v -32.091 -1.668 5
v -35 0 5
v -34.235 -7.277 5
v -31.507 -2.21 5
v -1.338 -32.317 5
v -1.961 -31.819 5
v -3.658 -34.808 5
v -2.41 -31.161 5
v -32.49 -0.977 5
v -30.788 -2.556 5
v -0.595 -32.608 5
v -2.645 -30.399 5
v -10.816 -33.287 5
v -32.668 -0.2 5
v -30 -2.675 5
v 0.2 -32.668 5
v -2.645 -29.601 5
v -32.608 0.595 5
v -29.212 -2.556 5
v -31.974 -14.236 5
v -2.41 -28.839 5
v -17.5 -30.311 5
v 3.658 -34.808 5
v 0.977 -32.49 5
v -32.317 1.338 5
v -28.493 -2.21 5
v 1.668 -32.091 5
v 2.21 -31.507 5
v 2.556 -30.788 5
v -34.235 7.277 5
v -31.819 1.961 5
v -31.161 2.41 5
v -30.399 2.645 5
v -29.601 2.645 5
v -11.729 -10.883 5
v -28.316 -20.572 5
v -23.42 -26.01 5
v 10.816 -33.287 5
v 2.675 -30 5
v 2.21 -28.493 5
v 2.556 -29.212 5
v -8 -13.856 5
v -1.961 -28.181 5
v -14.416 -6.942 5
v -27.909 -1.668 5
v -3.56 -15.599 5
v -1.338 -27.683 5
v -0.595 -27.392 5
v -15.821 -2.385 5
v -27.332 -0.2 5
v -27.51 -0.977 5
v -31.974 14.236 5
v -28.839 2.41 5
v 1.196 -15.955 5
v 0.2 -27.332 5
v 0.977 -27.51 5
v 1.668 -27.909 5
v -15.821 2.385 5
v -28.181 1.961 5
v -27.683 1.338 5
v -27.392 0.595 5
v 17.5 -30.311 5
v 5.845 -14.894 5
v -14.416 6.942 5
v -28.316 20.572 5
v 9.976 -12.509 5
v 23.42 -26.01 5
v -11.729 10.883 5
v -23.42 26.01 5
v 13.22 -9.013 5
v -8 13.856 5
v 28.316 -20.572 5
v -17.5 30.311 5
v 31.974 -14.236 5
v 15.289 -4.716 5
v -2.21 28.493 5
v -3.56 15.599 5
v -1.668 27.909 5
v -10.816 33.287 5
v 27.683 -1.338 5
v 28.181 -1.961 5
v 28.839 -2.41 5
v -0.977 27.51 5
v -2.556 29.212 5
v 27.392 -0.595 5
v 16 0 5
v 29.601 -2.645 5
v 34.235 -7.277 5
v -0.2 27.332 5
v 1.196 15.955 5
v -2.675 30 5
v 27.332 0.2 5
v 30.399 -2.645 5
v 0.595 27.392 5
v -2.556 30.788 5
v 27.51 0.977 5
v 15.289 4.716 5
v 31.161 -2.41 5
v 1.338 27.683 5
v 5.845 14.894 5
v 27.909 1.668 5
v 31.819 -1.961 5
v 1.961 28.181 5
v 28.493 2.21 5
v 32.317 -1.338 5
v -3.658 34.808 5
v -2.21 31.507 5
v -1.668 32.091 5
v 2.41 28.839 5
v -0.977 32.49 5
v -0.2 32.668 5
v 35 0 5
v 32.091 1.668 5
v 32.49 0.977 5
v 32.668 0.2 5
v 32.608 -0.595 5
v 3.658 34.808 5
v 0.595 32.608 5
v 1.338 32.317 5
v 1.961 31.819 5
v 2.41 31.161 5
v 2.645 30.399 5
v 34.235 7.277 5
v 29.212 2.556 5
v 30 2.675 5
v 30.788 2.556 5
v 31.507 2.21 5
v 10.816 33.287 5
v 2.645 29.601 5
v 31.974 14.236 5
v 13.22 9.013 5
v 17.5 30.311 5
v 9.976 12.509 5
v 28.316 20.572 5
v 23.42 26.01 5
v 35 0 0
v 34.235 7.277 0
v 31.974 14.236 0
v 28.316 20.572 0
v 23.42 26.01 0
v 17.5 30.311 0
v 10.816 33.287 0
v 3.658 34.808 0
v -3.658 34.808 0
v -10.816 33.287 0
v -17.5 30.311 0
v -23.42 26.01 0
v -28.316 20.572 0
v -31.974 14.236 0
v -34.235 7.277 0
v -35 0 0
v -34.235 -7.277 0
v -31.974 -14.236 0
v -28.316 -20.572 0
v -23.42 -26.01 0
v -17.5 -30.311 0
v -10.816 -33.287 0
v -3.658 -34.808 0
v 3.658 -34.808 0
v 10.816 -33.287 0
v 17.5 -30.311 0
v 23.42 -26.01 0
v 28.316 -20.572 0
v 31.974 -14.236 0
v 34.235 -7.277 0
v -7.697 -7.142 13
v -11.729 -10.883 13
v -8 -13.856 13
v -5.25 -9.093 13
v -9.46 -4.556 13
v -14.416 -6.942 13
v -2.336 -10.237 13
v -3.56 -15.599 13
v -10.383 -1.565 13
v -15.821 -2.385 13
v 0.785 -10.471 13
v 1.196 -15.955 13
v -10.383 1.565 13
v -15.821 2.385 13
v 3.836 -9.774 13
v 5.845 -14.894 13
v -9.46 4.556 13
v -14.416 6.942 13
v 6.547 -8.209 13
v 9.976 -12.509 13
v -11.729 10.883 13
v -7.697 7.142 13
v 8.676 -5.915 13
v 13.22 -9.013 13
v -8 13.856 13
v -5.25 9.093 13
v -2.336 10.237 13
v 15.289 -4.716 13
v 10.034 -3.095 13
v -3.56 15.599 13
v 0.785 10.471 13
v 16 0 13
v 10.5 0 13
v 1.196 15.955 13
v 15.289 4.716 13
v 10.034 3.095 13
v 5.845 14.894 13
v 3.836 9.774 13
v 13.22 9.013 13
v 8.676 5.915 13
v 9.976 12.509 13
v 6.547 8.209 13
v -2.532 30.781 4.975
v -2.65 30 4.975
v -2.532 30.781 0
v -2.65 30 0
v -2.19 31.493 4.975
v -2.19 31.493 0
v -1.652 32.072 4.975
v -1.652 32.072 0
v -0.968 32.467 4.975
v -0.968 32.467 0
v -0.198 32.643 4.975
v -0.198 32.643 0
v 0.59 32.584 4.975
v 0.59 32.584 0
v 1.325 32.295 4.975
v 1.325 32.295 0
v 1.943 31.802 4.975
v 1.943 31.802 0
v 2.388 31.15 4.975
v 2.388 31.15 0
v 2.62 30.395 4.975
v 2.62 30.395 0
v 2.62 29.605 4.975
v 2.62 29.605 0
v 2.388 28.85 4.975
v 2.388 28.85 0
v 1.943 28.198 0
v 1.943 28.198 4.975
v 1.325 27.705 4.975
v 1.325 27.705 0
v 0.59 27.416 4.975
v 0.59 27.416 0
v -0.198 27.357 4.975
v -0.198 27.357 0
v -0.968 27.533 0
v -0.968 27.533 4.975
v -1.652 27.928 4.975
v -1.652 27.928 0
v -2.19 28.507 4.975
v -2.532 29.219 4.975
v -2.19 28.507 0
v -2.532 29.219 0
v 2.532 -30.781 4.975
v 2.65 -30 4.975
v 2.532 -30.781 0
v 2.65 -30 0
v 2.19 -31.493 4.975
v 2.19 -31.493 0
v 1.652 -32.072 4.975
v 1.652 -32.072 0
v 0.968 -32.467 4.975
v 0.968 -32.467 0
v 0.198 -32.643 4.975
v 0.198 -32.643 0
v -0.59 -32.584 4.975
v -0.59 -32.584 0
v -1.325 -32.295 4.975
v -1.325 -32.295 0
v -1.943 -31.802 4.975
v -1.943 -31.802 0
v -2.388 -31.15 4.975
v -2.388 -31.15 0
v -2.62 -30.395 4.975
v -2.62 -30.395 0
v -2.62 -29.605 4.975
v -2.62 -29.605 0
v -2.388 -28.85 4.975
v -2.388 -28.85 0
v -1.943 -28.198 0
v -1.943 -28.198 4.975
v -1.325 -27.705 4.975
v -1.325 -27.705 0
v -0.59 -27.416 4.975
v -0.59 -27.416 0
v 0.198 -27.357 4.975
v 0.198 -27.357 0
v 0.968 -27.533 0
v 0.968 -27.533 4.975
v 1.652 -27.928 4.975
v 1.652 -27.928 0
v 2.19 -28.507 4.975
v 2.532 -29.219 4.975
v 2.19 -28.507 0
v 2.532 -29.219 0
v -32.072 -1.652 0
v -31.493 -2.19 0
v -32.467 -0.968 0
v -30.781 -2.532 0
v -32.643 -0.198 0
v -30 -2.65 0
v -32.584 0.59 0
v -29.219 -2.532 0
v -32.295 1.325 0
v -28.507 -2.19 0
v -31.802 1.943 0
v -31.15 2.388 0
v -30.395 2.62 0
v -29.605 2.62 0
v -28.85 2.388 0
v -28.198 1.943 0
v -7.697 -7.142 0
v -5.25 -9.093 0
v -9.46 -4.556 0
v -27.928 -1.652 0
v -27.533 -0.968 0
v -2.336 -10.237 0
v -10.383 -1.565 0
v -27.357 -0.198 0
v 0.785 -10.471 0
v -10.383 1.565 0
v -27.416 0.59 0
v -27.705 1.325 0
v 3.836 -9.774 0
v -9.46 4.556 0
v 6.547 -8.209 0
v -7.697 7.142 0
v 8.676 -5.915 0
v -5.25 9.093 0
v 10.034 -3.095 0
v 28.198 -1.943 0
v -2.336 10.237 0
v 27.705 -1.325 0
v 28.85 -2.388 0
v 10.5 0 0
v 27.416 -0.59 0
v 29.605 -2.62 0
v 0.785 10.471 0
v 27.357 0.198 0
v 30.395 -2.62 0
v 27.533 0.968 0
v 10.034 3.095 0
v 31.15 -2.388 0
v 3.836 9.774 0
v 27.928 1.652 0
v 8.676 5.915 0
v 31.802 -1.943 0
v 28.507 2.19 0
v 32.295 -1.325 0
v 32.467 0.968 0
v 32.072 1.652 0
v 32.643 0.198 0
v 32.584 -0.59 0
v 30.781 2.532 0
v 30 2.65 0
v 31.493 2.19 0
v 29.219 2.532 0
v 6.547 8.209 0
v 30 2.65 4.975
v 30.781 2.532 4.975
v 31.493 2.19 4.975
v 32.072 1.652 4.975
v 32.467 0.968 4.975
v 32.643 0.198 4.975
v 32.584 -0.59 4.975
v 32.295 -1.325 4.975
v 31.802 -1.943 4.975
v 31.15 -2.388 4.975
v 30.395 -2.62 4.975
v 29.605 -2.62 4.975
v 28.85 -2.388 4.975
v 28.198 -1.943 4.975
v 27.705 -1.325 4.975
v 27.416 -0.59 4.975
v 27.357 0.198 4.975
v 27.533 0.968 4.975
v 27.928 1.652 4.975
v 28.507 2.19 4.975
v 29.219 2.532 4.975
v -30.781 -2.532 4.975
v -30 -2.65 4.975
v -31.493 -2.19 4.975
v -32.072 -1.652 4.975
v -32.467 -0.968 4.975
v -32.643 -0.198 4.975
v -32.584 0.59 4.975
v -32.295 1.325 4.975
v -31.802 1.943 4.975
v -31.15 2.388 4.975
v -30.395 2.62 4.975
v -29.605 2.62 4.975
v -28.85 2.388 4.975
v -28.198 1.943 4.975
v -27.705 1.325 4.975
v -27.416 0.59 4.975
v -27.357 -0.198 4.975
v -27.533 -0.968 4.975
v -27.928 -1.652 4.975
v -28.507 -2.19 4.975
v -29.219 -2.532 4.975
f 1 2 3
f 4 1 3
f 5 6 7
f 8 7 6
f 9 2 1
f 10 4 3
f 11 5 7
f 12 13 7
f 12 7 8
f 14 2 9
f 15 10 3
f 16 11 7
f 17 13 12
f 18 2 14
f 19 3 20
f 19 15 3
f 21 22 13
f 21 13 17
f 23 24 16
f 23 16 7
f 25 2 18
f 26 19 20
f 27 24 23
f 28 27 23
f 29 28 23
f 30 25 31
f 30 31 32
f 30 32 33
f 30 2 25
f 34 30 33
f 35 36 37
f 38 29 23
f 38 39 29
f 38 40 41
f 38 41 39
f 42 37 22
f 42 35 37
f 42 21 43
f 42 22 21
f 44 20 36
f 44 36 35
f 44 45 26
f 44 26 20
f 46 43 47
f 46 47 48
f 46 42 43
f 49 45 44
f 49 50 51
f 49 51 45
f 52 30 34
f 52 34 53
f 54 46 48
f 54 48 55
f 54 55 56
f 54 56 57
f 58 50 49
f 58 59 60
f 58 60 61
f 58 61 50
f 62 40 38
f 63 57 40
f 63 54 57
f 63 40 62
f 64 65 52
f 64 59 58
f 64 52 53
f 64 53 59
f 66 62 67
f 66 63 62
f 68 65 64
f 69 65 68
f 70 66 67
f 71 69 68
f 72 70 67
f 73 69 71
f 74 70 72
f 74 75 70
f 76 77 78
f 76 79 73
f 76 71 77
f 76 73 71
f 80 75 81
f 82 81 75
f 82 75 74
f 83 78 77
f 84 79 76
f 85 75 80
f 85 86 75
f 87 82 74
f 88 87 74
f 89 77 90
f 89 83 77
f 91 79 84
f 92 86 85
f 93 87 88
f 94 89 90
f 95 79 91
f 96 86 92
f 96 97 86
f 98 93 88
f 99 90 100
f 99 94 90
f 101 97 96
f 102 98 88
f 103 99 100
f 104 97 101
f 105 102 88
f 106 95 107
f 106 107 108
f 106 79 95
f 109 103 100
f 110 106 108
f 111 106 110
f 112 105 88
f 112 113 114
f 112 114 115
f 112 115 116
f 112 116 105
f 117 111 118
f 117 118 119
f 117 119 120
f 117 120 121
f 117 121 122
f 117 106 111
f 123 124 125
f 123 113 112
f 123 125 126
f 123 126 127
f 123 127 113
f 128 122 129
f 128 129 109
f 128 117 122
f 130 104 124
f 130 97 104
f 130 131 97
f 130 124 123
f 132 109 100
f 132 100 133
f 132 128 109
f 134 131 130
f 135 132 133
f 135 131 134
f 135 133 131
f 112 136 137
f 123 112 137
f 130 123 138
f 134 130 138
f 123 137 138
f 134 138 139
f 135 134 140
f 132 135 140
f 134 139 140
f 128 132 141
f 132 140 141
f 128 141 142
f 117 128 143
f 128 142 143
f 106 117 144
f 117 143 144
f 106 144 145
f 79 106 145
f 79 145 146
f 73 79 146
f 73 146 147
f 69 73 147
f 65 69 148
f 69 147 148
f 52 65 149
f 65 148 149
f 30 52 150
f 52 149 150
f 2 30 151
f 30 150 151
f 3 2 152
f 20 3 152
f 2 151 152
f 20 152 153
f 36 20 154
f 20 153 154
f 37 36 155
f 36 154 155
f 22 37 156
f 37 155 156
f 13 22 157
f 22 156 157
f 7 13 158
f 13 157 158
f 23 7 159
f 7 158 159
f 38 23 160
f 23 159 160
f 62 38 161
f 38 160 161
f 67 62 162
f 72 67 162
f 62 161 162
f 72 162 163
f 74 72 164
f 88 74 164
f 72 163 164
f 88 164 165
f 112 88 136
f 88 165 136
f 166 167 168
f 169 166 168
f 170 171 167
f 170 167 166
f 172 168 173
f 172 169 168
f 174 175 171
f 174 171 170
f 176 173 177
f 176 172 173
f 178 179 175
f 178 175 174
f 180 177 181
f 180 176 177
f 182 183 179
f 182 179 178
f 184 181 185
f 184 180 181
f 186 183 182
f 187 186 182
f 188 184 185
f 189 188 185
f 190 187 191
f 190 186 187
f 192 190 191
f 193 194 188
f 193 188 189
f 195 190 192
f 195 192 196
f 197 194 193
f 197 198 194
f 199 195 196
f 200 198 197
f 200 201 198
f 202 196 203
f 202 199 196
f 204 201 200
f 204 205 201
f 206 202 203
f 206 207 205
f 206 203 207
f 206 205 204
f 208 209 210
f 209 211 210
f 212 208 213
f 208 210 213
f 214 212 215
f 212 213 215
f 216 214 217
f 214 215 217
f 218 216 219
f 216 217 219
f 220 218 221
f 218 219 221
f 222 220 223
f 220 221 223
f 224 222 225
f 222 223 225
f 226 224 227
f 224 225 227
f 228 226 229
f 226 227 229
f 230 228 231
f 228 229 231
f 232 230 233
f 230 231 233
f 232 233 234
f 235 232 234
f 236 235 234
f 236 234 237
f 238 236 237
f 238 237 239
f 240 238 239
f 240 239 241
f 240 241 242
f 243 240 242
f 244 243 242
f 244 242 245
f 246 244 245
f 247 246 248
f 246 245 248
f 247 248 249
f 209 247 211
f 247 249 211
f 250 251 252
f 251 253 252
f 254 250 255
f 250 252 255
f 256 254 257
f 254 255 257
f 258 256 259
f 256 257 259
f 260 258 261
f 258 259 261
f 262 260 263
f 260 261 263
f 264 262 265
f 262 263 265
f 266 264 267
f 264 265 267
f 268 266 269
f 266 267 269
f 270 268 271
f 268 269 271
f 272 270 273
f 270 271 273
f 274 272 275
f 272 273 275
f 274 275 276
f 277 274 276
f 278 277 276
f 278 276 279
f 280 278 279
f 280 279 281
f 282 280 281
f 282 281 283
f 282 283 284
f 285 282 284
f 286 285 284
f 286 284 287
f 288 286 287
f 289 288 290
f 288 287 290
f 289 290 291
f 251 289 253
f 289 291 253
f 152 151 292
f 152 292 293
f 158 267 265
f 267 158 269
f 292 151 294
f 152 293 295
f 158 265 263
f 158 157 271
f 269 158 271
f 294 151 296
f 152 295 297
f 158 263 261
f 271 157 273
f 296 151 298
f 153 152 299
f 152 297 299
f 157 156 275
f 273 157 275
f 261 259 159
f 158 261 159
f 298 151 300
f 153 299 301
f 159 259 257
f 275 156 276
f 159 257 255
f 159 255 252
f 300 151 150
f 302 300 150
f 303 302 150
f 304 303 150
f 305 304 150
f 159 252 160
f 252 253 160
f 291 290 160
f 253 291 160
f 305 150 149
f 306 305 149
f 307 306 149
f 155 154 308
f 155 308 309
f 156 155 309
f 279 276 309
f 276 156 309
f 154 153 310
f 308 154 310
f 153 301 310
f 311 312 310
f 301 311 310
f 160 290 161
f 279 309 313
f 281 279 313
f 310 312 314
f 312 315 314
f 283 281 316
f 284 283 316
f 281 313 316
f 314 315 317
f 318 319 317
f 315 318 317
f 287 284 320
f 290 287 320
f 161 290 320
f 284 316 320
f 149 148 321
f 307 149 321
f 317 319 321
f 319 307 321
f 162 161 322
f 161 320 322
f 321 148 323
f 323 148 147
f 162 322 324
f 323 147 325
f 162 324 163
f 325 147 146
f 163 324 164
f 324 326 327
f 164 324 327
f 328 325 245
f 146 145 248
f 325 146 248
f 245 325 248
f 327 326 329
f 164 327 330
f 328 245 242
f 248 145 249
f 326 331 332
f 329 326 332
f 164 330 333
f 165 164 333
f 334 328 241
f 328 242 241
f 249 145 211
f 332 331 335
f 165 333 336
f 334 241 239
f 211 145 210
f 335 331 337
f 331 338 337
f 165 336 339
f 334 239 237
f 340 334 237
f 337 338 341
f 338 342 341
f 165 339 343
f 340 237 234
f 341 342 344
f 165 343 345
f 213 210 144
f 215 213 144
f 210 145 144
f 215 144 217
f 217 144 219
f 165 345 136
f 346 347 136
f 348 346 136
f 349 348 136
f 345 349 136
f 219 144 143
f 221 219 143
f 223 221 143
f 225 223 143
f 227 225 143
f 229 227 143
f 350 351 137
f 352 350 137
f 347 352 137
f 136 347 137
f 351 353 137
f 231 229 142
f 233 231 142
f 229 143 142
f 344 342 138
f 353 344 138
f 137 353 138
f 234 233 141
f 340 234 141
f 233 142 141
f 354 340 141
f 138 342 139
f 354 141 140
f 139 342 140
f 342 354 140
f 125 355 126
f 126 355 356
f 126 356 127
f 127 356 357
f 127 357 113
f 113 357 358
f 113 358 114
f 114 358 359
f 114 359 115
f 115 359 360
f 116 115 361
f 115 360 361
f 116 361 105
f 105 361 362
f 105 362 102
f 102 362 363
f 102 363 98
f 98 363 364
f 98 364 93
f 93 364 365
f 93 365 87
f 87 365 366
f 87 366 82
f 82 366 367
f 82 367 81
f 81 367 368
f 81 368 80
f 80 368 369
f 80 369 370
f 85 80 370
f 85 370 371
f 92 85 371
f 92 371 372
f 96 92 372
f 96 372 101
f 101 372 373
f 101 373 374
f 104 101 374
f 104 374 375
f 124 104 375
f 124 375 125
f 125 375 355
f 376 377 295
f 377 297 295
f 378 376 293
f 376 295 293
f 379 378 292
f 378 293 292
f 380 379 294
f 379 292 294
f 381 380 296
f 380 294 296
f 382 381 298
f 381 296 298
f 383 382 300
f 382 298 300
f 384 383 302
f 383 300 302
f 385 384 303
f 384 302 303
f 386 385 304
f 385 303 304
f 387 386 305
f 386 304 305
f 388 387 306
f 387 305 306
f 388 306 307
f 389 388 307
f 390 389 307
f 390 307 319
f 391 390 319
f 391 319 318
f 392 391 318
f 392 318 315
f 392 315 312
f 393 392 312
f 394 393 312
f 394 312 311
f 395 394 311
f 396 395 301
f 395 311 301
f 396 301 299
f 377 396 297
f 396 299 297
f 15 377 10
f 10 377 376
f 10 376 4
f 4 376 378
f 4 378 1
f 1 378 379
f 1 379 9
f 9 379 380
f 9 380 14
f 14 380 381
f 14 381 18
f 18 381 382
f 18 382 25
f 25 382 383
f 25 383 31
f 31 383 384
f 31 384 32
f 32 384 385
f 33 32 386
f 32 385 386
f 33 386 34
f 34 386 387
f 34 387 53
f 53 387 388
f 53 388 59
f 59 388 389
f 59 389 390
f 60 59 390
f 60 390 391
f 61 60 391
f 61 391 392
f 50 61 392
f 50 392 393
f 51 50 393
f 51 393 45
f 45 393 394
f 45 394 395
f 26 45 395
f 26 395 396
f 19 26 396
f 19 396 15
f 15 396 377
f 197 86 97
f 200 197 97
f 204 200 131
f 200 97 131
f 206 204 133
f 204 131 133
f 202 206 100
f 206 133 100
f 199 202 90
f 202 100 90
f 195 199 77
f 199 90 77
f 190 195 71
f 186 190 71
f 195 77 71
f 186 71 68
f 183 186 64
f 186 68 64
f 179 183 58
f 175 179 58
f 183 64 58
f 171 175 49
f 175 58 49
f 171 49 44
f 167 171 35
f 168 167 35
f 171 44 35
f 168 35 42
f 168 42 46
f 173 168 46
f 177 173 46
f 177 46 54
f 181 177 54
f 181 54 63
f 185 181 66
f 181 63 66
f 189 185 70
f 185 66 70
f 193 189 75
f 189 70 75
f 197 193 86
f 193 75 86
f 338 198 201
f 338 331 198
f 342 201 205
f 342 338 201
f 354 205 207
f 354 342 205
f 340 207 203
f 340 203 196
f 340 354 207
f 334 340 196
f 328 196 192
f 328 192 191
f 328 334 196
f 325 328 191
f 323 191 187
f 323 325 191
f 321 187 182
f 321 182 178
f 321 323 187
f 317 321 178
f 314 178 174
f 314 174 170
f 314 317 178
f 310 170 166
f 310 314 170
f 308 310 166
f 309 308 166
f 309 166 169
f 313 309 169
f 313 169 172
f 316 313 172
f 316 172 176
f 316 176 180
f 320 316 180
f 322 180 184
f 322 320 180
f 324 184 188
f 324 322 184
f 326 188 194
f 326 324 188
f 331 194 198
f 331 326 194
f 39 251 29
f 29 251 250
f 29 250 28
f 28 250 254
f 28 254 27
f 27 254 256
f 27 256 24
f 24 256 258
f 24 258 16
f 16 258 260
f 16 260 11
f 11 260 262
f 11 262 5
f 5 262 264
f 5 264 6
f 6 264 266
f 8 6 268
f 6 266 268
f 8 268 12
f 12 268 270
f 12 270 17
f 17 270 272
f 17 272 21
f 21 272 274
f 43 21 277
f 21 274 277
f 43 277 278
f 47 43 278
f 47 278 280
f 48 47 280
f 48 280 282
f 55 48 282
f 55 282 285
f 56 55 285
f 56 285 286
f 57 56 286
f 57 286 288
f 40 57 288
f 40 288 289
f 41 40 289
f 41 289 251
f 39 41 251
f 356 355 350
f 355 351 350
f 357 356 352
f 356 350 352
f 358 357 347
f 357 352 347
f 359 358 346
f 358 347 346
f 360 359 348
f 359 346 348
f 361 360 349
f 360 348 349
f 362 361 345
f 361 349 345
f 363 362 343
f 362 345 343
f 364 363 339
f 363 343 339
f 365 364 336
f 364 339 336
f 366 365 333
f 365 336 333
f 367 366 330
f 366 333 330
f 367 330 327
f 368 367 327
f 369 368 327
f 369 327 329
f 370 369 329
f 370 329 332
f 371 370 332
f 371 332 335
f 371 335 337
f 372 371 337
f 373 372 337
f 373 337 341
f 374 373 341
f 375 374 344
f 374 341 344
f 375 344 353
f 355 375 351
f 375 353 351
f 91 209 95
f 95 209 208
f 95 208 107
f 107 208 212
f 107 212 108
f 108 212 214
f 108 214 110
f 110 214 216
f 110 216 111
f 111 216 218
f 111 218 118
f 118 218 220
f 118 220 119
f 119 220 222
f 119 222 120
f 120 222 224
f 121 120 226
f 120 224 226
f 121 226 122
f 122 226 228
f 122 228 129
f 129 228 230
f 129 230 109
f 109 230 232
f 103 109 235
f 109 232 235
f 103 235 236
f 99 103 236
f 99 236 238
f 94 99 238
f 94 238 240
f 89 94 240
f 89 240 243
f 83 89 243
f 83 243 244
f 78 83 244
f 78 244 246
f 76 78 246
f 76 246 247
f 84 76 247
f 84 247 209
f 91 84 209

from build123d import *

# Parameters (mm, degrees)
SKETCH1_R                      = 35
SKETCH1_R_2                    = 10.5
BOSS_EXTRUDE1_DEPTH            = 5
M5_CLEARANCE_HOLE1_D           = 5.3
M5_CLEARANCE_HOLE1_CSINK_D     = 5.35
M5_CLEARANCE_HOLE1_CSINK_ANGLE = 90
CIRPATTERN1_COUNT              = 4
SKETCH5_R                      = 16
SKETCH5_R_2                    = 10.5
BOSS_EXTRUDE2_DEPTH            = 8


with BuildPart() as part:
    # Sketch1 → Boss-Extrude1 (new body)
    with BuildSketch(Plane.XY):
        Circle(SKETCH1_R)
        Circle(SKETCH1_R_2, mode=Mode.SUBTRACT)
    extrude(amount=BOSS_EXTRUDE1_DEPTH)

    # M5 Clearance Hole1 (through all)
    with Locations(Plane.XY.offset(5)):
        with Locations((0, 30)):
            m5_clearance_hole1 = CounterSinkHole(M5_CLEARANCE_HOLE1_D / 2, M5_CLEARANCE_HOLE1_CSINK_D / 2, counter_sink_angle=M5_CLEARANCE_HOLE1_CSINK_ANGLE)

    # CirPattern1: M5 Clearance Hole1 ×4 about axis
    cirpattern1_axis = Axis((0, 0, 0), (0, 0, 1))
    for i in range(1, CIRPATTERN1_COUNT):
        add(m5_clearance_hole1.rotate(cirpattern1_axis, i * 360 / CIRPATTERN1_COUNT), mode=Mode.SUBTRACT)

    # Sketch5 → Boss-Extrude2 (add)
    with BuildSketch(Plane.XY.offset(5)):
        Circle(SKETCH5_R)
        Circle(SKETCH5_R_2, mode=Mode.SUBTRACT)
    extrude(amount=BOSS_EXTRUDE2_DEPTH)


solid = part.part
